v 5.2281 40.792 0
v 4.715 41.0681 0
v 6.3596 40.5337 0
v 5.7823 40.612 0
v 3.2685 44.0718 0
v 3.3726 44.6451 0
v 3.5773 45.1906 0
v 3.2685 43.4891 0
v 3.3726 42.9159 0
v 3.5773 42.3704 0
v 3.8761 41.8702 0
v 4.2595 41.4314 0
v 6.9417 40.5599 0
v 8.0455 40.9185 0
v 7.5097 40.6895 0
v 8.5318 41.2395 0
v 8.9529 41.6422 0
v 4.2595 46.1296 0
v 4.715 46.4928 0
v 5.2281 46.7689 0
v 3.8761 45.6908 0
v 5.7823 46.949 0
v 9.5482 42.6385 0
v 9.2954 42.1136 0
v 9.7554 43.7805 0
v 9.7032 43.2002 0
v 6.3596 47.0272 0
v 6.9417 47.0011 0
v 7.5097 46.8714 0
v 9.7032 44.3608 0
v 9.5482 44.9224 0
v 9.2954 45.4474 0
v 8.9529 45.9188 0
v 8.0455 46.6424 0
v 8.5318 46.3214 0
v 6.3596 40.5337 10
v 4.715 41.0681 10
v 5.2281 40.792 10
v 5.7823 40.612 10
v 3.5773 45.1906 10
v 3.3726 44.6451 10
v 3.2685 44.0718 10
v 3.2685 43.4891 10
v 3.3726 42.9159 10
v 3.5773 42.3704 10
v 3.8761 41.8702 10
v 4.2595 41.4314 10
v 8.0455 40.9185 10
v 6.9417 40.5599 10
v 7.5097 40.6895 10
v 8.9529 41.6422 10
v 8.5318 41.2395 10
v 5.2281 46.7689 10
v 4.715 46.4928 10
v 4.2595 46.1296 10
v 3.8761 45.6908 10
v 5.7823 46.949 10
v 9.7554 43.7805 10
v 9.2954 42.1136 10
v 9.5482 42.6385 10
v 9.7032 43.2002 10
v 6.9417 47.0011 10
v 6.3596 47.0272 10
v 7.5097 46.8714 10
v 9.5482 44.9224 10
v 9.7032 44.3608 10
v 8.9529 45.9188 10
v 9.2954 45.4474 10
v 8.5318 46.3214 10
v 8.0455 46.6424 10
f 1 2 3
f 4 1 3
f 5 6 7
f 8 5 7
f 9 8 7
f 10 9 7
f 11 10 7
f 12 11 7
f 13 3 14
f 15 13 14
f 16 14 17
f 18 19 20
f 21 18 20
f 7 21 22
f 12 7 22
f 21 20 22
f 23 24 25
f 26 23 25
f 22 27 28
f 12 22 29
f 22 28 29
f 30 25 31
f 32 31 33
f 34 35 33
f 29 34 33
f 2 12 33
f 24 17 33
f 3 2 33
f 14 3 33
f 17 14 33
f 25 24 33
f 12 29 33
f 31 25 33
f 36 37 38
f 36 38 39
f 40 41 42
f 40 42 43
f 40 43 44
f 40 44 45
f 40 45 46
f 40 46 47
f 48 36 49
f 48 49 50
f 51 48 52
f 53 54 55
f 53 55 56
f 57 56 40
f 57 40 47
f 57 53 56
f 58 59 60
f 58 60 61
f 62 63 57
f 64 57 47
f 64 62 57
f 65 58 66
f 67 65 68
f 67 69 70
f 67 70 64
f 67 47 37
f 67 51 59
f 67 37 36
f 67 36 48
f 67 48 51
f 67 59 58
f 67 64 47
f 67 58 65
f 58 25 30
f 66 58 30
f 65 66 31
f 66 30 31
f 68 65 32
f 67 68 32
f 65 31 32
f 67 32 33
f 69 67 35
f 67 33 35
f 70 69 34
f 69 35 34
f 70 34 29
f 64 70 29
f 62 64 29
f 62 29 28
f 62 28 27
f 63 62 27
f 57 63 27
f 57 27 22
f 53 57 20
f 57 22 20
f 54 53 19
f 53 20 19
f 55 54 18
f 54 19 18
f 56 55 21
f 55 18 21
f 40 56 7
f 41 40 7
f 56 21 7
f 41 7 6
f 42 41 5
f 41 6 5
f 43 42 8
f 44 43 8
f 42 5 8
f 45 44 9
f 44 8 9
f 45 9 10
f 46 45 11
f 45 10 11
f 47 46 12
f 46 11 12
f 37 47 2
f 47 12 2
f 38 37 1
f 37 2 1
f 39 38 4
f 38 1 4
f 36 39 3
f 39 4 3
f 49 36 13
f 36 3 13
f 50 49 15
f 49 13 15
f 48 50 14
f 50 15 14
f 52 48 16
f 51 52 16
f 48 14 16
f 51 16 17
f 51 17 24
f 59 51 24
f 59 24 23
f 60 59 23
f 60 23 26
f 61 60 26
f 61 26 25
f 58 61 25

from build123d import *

# Parameters (mm, degrees)
SKETCH_R         = 3.25
EXTRUDE023_DEPTH = 10
EXTRUDE022_DEPTH = 10


with BuildPart() as extrude023:
    # Sketch → Extrude023 (new body)
    with BuildSketch(Plane.XY):
        with Locations((6.505444, 43.780474)):
            Circle(SKETCH_R)
    extrude(amount=EXTRUDE023_DEPTH)


with BuildPart() as led_base:
    # Sketch → Extrude022 (new body)
    with BuildSketch(Plane.XY):
        with Locations((6.505444, 43.780474)):
            Circle(SKETCH_R)
    extrude(amount=EXTRUDE022_DEPTH)

    # Fusion010: union Extrude023
    add(extrude023.part)


solid = led_base.part
